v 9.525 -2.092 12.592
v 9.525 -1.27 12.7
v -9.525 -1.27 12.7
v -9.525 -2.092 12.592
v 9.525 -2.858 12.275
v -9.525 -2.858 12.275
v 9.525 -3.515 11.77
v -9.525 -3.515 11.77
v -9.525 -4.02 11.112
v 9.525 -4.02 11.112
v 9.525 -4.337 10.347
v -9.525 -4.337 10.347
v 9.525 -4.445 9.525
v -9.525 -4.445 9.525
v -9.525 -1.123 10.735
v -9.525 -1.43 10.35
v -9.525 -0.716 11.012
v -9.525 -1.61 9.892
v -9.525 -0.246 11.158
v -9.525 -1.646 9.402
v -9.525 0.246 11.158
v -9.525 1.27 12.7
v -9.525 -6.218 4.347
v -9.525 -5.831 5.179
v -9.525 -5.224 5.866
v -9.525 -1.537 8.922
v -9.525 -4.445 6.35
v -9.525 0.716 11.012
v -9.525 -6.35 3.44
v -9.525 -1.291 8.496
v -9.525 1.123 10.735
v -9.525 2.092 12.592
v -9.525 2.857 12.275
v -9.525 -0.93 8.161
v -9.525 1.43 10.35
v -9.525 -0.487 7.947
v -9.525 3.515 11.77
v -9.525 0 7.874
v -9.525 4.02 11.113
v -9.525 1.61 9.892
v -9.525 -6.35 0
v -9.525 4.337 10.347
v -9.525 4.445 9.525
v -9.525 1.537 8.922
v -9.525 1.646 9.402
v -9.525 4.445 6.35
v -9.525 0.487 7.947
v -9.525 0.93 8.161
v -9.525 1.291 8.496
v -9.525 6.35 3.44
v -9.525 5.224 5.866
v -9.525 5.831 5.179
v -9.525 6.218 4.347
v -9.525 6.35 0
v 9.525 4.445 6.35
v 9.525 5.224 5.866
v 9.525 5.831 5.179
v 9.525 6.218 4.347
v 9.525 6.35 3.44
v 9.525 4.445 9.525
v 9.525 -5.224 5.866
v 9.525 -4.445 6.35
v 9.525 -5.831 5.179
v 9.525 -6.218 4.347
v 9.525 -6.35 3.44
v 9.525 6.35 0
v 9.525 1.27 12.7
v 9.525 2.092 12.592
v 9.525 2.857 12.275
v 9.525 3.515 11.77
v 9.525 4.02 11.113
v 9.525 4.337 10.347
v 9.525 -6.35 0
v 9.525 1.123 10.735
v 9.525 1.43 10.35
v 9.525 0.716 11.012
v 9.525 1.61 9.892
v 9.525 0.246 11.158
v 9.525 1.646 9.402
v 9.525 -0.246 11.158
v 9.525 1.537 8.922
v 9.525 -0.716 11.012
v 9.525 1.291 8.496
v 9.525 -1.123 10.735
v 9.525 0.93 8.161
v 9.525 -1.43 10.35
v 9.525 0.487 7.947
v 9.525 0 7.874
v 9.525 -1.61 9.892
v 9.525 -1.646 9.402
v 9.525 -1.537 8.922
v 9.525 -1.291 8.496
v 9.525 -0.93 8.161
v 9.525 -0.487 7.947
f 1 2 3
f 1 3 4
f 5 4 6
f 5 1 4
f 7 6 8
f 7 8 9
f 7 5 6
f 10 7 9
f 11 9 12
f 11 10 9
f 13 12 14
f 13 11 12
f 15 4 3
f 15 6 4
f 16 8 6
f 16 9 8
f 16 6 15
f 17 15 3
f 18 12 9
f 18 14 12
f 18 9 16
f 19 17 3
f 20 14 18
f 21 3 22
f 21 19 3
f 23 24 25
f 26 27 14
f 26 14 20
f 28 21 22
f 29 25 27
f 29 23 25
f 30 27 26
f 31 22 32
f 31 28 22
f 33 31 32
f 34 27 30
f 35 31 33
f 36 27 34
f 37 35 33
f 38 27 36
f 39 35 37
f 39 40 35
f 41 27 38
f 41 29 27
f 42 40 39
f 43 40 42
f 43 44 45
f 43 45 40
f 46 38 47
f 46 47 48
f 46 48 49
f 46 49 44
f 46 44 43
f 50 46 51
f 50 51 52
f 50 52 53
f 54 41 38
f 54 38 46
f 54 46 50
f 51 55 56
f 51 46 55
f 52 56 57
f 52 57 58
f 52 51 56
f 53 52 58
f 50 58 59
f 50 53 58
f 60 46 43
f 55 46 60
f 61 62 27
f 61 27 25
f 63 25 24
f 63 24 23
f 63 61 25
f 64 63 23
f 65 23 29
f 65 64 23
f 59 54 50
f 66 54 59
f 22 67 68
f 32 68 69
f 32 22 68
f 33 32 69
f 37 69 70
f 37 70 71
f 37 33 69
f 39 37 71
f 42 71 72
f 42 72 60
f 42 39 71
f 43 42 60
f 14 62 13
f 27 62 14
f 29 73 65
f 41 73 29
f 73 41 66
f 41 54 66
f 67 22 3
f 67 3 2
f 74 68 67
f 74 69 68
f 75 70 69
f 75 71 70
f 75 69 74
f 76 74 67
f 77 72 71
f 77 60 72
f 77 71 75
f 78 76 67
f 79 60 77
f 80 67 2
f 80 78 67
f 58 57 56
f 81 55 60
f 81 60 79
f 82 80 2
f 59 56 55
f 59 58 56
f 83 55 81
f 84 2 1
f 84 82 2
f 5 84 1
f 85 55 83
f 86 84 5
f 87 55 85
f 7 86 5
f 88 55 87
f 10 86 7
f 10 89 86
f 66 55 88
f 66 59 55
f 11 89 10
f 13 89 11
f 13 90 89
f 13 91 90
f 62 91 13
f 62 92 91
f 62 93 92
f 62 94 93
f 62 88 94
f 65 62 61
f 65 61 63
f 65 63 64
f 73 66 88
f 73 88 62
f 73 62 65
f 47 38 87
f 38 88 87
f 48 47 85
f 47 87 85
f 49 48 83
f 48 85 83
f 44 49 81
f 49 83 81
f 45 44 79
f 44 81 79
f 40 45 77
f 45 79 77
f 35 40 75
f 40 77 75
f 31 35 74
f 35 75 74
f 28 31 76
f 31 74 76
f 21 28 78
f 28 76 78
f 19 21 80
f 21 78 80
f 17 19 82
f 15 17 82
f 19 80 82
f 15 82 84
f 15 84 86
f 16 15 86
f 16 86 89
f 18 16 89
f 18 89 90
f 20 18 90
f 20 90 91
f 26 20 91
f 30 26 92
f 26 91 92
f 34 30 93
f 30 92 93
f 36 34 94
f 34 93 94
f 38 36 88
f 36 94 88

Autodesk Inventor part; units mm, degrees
ref_plane "YZ Plane" through (0, 0, 0) normal (1, 0, 0) x (0, 1, 0)
ref_plane "XZ Plane" through (0, 0, 0) normal (0, 1, 0) x (-1, 0, 0)
ref_plane "XY Plane" through (0, 0, 0) normal (0, 0, 1) x (1, 0, 0)
sketch "Sketch1" plane through (0, 0, 0) normal (0, 0, 1) x (1, 0, 0)
  line L0 (9.525, -6.35) -> (-9.525, -6.35)
  line L1 (-9.525, -6.35) -> (-9.525, 6.35)
  line L2 (-9.525, 6.35) -> (9.525, 6.35)
  line L3 (9.525, 6.35) -> (9.525, -6.35)
  line L4 (9.525, -6.35) -> (-9.525, 6.35) construction
  line L5 (-9.525, -6.35) -> (9.525, 6.35) construction
  point P0 (0, 0)
  dimension "d0" = 19.05
  dimension "d1" = 12.7
extrude "Extrusion1" add sketch "Sketch1" along normal blind 6.35
sketch "Sketch2" plane through (0, 0, 6.35) normal (0, 0, 1) x (1, 0, 0)
  line L0 (9.525, 6.35) -> (-9.525, 6.35) projected
  line L1 (-9.525, 6.35) -> (-9.525, -6.35) projected
  line L2 (-9.525, -6.35) -> (9.525, -6.35) projected
  line L3 (9.525, -6.35) -> (9.525, 6.35) projected
  line L4 (9.525, -4.445) -> (-9.525, -4.445)
  line L5 (-9.525, -4.445) -> (-9.525, 4.445)
  line L6 (-9.525, 4.445) -> (9.525, 4.445)
  line L7 (9.525, 4.445) -> (9.525, -4.445)
  line L8 (9.525, -4.445) -> (-9.525, 4.445) construction
  line L9 (-9.525, -4.445) -> (9.525, 4.445) construction
  point P0 (0, 0)
  dimension "d4" = 19.05
  dimension "d5" = 8.89
extrude "Extrusion2" add sketch "Sketch2" along normal blind 6.35 contours L3 L4 L1 L6
sketch "Sketch3" plane through (9.525, -6.35, 0) normal (1, 0, 0) x (0, 0, -1)
  line L0 (0, 0) -> (0, 12.7) projected
  line L1 (0, 12.7) -> (-6.35, 12.7) projected
  line L2 (-6.35, 10.795) -> (-6.35, 12.7) projected
  line L3 (-6.35, 10.795) -> (-12.7, 10.795) projected
  line L4 (-12.7, 1.905) -> (-12.7, 10.795) projected
  line L5 (-6.35, 1.905) -> (-12.7, 1.905) projected
  line L6 (-6.35, 0) -> (-6.35, 1.905) projected
  line L7 (0, 0) -> (-6.35, 0) projected
  line L8 (-6.35, 12.7) -> (-6.35, 10.795) construction
  line L9 (-6.35, 10.795) -> (-6.35, 1.905) construction
  line L10 (-12.7, 6.35) -> (0, 6.35) construction
  line L11 (-9.525, 10.795) -> (-9.525, 1.905) construction
  line L12 (-6.35, 1.905) -> (-12.7, 1.905) construction
  circle A0 centre (-9.525, 6.35) radius 1.651
  dimension "d8" = 3.302
extrude "Extrusion3" cut sketch "Sketch3" against normal through all contours A0
fillet "Fillet1" radius 3.175 4 edges at (0, 4.445, 12.7) (0, -4.445, 12.7) (0, 6.35, 6.35) (0, -6.35, 6.35)
properties part number "Torsion_Spring_Mounts"
